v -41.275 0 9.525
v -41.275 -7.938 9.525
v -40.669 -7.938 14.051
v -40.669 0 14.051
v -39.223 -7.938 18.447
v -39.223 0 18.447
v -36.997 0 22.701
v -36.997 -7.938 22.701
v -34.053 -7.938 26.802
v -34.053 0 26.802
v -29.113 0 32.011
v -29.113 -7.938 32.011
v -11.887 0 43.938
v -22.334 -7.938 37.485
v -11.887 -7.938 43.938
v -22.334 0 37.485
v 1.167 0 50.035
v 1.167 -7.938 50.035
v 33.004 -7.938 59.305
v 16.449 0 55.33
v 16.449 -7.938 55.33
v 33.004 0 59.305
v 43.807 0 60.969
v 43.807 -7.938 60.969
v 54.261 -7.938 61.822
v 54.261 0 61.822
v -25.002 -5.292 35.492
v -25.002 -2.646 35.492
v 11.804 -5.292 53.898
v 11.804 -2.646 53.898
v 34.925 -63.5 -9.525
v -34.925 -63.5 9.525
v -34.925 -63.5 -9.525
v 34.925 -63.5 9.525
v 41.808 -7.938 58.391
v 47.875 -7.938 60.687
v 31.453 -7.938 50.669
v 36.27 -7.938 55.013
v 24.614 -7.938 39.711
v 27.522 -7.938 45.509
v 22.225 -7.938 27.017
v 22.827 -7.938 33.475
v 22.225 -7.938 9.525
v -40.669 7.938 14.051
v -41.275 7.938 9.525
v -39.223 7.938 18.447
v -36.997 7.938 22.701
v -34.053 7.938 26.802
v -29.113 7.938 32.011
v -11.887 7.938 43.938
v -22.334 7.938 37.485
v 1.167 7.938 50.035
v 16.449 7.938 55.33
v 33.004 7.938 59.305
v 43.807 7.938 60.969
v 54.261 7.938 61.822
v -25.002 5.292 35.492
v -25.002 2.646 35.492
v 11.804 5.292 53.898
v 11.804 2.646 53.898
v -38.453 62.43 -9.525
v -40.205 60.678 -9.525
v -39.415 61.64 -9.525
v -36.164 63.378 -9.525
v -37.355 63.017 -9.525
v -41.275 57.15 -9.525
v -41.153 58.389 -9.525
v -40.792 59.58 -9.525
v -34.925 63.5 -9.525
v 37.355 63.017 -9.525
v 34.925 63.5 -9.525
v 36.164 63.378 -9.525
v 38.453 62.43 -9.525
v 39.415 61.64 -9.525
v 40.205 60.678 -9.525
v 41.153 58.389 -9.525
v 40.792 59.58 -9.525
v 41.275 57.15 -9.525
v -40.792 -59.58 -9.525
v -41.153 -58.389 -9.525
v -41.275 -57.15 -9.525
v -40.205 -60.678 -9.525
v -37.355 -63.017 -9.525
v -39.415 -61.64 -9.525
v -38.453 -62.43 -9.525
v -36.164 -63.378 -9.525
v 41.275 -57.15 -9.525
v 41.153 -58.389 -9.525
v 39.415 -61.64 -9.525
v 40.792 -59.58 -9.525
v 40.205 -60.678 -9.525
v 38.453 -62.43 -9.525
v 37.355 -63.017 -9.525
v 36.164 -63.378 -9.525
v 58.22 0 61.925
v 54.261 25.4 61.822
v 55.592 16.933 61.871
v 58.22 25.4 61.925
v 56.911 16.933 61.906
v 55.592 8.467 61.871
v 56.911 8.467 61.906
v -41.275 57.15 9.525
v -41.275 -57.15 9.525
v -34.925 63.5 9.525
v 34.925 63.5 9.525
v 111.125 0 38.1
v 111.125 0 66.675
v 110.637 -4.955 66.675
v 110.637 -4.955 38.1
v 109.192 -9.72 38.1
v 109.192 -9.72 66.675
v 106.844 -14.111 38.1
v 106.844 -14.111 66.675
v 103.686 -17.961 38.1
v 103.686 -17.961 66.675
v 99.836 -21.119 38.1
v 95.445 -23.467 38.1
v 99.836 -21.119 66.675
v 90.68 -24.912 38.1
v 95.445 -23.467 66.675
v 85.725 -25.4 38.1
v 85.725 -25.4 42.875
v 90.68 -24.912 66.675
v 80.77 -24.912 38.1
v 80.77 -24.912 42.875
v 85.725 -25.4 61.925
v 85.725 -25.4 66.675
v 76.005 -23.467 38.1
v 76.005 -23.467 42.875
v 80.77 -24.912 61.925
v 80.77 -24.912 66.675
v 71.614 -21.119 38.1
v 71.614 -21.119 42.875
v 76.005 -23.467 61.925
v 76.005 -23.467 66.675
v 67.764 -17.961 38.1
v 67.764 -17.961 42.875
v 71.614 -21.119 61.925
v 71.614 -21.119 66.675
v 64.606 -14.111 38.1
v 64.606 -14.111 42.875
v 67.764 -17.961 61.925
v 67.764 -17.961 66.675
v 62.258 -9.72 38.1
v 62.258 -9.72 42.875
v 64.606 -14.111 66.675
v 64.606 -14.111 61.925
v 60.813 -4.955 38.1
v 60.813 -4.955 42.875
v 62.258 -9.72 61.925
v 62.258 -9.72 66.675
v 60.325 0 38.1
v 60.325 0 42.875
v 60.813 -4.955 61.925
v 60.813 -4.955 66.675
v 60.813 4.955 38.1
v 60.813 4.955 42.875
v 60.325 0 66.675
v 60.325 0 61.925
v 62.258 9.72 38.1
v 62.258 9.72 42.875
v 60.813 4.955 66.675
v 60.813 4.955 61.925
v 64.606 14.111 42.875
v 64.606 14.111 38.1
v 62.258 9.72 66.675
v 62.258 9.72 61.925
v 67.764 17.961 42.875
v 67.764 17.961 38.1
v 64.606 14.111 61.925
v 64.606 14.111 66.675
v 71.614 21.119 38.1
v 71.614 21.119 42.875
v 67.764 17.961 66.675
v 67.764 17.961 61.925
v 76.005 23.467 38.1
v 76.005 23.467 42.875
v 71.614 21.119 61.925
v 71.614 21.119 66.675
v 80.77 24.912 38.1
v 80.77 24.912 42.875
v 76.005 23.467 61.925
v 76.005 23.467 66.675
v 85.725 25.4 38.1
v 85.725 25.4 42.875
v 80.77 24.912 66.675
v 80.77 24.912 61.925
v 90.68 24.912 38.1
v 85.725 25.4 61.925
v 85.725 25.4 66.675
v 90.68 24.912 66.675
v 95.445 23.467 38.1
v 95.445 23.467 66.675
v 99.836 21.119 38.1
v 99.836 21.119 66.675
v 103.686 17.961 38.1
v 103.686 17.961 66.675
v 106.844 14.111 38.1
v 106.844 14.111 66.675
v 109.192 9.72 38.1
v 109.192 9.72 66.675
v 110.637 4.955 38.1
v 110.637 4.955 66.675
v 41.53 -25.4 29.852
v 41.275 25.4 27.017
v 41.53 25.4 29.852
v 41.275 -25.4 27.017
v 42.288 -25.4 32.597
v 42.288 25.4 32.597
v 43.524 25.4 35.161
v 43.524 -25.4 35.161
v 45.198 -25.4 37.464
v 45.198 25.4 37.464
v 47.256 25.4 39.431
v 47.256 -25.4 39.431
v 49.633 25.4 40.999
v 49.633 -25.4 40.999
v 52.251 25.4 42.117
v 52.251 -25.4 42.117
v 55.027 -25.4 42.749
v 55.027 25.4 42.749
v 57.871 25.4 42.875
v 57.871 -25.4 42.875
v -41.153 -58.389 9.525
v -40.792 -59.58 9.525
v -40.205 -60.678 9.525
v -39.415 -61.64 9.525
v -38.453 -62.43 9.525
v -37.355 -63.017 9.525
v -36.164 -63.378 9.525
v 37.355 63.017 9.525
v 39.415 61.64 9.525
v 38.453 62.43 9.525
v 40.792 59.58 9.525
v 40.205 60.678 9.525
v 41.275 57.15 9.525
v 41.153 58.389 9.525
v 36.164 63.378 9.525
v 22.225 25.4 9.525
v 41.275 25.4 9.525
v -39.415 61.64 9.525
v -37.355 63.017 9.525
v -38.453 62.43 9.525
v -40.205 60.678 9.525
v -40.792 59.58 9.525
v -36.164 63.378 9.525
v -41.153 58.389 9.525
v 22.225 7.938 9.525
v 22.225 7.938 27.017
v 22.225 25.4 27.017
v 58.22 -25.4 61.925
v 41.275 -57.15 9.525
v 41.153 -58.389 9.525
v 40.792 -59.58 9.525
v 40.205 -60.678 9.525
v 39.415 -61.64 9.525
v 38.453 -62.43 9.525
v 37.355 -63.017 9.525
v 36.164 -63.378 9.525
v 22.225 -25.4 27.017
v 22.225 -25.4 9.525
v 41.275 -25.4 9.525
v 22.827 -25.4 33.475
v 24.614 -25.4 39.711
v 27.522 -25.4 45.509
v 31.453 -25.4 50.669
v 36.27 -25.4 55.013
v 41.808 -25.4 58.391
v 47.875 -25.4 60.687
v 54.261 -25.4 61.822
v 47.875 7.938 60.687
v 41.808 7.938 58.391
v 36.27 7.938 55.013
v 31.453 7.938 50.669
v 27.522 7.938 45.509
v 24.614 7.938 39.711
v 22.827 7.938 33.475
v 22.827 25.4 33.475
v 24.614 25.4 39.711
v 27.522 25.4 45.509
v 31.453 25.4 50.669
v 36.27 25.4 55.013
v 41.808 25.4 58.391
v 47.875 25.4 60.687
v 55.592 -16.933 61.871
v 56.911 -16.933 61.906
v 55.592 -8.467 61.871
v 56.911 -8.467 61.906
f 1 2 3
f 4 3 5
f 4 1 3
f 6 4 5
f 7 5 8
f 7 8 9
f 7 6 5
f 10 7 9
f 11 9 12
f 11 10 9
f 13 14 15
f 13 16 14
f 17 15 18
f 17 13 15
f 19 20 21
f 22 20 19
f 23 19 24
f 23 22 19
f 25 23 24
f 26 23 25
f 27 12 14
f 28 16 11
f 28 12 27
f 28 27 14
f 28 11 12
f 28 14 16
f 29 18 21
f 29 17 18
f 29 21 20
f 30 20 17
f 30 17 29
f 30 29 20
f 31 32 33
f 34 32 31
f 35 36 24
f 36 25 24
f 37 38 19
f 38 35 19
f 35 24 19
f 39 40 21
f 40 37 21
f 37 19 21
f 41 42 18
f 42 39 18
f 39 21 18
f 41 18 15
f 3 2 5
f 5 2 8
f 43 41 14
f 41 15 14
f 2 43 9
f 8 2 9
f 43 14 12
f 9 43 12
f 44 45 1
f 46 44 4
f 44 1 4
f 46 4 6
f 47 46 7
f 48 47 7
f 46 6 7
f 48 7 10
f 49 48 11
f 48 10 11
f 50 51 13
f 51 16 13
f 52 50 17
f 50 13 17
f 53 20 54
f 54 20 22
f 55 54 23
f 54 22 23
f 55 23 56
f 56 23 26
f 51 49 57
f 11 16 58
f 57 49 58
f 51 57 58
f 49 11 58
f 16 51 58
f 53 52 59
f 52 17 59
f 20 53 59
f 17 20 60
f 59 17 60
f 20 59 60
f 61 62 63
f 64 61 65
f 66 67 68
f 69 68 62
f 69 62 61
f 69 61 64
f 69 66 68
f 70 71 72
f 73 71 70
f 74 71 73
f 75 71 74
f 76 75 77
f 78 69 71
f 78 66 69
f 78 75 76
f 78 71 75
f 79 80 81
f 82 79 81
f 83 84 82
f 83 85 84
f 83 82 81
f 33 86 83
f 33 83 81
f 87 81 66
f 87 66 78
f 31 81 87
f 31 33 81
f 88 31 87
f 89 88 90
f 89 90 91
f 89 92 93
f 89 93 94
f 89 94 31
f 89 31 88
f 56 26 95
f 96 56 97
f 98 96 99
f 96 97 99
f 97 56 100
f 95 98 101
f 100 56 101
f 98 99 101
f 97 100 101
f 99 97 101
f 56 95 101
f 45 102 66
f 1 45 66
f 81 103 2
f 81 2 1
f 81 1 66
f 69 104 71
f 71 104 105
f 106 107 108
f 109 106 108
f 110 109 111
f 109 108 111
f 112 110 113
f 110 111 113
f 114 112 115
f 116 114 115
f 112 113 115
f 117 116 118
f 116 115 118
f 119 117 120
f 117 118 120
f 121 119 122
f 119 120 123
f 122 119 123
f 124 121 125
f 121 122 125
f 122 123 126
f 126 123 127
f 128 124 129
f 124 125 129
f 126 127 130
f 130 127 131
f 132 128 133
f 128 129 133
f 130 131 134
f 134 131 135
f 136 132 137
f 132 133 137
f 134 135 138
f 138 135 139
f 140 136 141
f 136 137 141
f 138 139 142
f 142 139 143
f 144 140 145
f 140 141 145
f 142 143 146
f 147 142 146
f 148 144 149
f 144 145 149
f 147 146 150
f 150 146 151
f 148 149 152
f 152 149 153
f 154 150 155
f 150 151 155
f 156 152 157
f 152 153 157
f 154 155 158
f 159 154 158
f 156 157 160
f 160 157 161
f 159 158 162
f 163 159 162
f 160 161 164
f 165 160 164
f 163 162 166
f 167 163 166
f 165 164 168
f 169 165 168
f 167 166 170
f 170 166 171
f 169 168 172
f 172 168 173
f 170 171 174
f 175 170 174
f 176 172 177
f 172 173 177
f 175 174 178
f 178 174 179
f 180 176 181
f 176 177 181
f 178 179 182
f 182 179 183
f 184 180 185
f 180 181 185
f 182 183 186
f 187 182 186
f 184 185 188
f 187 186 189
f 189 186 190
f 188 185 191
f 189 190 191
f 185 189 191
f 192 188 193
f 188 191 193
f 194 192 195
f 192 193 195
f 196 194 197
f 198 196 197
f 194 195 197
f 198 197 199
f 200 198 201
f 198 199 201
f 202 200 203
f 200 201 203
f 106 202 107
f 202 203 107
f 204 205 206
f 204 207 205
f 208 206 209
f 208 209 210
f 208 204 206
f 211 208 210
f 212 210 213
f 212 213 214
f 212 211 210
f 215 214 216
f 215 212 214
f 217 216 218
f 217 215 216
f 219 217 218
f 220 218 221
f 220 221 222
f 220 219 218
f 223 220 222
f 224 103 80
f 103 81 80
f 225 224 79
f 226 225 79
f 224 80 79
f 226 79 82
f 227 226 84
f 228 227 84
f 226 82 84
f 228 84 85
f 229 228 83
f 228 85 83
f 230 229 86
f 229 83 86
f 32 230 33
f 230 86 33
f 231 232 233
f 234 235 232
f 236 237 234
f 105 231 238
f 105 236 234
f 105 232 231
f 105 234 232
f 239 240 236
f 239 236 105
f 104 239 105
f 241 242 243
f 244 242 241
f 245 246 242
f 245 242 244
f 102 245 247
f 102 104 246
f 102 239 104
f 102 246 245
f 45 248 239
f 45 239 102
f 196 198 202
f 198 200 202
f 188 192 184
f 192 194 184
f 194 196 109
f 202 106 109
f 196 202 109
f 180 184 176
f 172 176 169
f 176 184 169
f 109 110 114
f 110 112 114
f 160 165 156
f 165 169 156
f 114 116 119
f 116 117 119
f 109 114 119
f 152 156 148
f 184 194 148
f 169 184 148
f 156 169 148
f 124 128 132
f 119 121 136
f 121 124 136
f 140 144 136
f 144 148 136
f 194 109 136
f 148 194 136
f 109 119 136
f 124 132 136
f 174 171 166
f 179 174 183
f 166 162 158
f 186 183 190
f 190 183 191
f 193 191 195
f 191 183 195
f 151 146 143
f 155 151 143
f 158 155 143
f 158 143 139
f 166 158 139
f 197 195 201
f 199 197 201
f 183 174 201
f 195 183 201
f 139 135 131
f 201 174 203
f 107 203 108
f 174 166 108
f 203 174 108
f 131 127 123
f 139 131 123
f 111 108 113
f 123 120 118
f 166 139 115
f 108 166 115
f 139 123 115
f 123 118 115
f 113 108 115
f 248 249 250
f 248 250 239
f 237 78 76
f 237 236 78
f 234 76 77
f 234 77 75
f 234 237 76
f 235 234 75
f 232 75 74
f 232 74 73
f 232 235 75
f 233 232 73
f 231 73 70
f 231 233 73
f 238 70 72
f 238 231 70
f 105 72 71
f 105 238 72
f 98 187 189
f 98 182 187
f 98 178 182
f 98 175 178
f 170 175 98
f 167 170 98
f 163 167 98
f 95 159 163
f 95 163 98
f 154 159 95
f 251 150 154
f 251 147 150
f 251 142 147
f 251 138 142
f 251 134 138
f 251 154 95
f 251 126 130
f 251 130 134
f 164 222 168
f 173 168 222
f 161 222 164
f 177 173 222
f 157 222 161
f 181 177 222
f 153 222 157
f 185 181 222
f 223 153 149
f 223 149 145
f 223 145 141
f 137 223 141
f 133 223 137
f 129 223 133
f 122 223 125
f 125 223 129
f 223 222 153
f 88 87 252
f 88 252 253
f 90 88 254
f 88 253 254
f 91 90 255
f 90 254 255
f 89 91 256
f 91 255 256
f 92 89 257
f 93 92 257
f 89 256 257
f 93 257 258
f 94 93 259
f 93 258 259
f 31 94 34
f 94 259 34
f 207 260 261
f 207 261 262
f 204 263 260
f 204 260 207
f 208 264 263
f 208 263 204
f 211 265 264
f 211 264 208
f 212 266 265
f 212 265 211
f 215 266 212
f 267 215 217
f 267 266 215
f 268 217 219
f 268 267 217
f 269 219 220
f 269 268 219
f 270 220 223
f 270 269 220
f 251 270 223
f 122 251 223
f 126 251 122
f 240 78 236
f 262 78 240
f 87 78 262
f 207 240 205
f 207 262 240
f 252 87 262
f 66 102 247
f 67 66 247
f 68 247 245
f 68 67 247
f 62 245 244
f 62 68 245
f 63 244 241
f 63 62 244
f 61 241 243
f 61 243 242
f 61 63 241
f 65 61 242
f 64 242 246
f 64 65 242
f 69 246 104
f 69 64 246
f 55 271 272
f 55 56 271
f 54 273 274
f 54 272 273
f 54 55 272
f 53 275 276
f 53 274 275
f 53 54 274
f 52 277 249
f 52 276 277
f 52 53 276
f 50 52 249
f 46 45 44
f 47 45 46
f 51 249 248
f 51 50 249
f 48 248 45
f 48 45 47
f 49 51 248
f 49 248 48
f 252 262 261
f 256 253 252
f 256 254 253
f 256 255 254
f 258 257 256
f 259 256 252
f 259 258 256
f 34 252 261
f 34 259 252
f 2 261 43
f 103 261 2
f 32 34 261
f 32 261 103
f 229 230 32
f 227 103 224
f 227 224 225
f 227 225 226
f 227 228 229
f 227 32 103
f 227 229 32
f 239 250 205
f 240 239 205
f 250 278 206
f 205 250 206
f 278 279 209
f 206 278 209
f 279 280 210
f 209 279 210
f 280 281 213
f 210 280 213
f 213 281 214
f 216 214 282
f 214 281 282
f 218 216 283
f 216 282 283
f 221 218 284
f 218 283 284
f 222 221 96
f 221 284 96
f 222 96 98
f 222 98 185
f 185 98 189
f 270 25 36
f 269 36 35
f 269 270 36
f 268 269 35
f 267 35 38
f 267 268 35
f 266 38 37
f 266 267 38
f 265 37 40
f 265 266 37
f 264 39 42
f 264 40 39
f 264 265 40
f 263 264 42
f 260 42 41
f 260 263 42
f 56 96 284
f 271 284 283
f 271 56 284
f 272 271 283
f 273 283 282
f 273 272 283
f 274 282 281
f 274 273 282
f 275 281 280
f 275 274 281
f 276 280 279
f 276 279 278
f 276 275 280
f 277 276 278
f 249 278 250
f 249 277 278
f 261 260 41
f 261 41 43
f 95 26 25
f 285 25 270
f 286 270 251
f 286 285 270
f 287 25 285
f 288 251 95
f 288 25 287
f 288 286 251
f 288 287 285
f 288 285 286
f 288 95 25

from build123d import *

# Parameters (mm, degrees)
F1_DEPTH = 63.5
F0_W     = 25.4
F0_H     = 19.05
F2_DEPTH = 25.4
F3_DEPTH = 7.9375
F4_DEPTH = 25.4
F6_R     = 6.35


with BuildPart() as f1:
    # F0 (on Front) → F1 (new body, symmetric)
    with BuildSketch(Plane.XZ):
        Polygon((22.225, 9.525), (-41.275, 9.525), (-41.275, -9.525), (41.275, -9.525), (41.275, 9.525), align=None)
    extrude(amount=F1_DEPTH, both=True)

    # F0 (on Front) → F2 (join, symmetric)
    with BuildSketch(Plane.XZ):
        with Locations((73.025, 52.4002)):
            Rectangle(F0_W, F0_H)
        with BuildLine():
            Line((22.225, 27.0165912208), (22.225, 9.525))
            Line((22.225, 9.525), (41.275, 9.525))
            Line((41.275, 9.525), (41.275, 27.0165912208))
            ThreePointArc((41.275, 27.0165912208), (46.1826320332, 38.4940676368), (57.8712160479, 42.8752))
            Line((57.8712160479, 42.8752), (60.325, 42.8752))
            Line((60.325, 42.8752), (60.325, 61.9252))
            Line((60.325, 61.9252), (58.2198869565, 61.9252))
            add(Edge.make_bspline(
                [(54.2612726793, 61.8219195408), (55.5968119666, 61.8785577598), (56.917161192, 61.9131437071), (58.2198869565, 61.9252)],
                knots=[108.8449381095, 108.8449381095, 108.8449381095, 108.8449381095, 112.4500488685, 112.4500488685, 112.4500488685, 112.4500488685], degree=3))
            ThreePointArc((54.2612726793, 61.8219195408), (31.4532645393, 50.66893596), (22.225, 27.0165912208))
        make_face()
    extrude(amount=F2_DEPTH, both=True)

    # F0 (on Front) → F3 (join, symmetric)
    with BuildSketch(Plane.XZ):
        with BuildLine():
            add(Edge.make_bspline(
                [(-41.275, 9.525), (-40.2299736502, 38.3002045249), (13.9388801659, 60.1119073253), (54.2612726793, 61.8219195408)],
                knots=[0, 0, 0, 0, 108.8449381095, 108.8449381095, 108.8449381095, 108.8449381095], degree=3))
            Line((-41.275, 9.525), (22.225, 9.525))
            Line((22.225, 9.525), (22.225, 27.0165912208))
            ThreePointArc((22.225, 27.0165912208), (31.4532645393, 50.66893596), (54.2612726793, 61.8219195408))
        make_face()
    extrude(amount=F3_DEPTH, both=True)

    # F0 (on Front) → F4 (join, symmetric)
    with BuildSketch(Plane.XZ):
        with Locations((73.025, 52.4002)):
            Rectangle(F0_W, F0_H)
    extrude(amount=F4_DEPTH, both=True)

    # F0 (on Front) → F5 (revolve)
    with BuildSketch(Plane.XZ):
        Polygon((85.725, 66.675), (85.725, 61.9252), (85.725, 42.8752), (85.725, 38.1), (111.125, 38.1), (111.125, 66.675), align=None)
    revolve(axis=Axis((85.725, 0, 52.3875), (0, 0, -1)))

    # F6
    f6_edges = [f1.edges().sort_by_distance(p)[0] for p in [
        (-41.275, -63.5, 0),
        (41.275, -63.5, 0),
        (41.275, 63.5, 0),
        (-41.275, 63.5, 0),
    ]]
    fillet(f6_edges, radius=F6_R)


solid = f1.part
